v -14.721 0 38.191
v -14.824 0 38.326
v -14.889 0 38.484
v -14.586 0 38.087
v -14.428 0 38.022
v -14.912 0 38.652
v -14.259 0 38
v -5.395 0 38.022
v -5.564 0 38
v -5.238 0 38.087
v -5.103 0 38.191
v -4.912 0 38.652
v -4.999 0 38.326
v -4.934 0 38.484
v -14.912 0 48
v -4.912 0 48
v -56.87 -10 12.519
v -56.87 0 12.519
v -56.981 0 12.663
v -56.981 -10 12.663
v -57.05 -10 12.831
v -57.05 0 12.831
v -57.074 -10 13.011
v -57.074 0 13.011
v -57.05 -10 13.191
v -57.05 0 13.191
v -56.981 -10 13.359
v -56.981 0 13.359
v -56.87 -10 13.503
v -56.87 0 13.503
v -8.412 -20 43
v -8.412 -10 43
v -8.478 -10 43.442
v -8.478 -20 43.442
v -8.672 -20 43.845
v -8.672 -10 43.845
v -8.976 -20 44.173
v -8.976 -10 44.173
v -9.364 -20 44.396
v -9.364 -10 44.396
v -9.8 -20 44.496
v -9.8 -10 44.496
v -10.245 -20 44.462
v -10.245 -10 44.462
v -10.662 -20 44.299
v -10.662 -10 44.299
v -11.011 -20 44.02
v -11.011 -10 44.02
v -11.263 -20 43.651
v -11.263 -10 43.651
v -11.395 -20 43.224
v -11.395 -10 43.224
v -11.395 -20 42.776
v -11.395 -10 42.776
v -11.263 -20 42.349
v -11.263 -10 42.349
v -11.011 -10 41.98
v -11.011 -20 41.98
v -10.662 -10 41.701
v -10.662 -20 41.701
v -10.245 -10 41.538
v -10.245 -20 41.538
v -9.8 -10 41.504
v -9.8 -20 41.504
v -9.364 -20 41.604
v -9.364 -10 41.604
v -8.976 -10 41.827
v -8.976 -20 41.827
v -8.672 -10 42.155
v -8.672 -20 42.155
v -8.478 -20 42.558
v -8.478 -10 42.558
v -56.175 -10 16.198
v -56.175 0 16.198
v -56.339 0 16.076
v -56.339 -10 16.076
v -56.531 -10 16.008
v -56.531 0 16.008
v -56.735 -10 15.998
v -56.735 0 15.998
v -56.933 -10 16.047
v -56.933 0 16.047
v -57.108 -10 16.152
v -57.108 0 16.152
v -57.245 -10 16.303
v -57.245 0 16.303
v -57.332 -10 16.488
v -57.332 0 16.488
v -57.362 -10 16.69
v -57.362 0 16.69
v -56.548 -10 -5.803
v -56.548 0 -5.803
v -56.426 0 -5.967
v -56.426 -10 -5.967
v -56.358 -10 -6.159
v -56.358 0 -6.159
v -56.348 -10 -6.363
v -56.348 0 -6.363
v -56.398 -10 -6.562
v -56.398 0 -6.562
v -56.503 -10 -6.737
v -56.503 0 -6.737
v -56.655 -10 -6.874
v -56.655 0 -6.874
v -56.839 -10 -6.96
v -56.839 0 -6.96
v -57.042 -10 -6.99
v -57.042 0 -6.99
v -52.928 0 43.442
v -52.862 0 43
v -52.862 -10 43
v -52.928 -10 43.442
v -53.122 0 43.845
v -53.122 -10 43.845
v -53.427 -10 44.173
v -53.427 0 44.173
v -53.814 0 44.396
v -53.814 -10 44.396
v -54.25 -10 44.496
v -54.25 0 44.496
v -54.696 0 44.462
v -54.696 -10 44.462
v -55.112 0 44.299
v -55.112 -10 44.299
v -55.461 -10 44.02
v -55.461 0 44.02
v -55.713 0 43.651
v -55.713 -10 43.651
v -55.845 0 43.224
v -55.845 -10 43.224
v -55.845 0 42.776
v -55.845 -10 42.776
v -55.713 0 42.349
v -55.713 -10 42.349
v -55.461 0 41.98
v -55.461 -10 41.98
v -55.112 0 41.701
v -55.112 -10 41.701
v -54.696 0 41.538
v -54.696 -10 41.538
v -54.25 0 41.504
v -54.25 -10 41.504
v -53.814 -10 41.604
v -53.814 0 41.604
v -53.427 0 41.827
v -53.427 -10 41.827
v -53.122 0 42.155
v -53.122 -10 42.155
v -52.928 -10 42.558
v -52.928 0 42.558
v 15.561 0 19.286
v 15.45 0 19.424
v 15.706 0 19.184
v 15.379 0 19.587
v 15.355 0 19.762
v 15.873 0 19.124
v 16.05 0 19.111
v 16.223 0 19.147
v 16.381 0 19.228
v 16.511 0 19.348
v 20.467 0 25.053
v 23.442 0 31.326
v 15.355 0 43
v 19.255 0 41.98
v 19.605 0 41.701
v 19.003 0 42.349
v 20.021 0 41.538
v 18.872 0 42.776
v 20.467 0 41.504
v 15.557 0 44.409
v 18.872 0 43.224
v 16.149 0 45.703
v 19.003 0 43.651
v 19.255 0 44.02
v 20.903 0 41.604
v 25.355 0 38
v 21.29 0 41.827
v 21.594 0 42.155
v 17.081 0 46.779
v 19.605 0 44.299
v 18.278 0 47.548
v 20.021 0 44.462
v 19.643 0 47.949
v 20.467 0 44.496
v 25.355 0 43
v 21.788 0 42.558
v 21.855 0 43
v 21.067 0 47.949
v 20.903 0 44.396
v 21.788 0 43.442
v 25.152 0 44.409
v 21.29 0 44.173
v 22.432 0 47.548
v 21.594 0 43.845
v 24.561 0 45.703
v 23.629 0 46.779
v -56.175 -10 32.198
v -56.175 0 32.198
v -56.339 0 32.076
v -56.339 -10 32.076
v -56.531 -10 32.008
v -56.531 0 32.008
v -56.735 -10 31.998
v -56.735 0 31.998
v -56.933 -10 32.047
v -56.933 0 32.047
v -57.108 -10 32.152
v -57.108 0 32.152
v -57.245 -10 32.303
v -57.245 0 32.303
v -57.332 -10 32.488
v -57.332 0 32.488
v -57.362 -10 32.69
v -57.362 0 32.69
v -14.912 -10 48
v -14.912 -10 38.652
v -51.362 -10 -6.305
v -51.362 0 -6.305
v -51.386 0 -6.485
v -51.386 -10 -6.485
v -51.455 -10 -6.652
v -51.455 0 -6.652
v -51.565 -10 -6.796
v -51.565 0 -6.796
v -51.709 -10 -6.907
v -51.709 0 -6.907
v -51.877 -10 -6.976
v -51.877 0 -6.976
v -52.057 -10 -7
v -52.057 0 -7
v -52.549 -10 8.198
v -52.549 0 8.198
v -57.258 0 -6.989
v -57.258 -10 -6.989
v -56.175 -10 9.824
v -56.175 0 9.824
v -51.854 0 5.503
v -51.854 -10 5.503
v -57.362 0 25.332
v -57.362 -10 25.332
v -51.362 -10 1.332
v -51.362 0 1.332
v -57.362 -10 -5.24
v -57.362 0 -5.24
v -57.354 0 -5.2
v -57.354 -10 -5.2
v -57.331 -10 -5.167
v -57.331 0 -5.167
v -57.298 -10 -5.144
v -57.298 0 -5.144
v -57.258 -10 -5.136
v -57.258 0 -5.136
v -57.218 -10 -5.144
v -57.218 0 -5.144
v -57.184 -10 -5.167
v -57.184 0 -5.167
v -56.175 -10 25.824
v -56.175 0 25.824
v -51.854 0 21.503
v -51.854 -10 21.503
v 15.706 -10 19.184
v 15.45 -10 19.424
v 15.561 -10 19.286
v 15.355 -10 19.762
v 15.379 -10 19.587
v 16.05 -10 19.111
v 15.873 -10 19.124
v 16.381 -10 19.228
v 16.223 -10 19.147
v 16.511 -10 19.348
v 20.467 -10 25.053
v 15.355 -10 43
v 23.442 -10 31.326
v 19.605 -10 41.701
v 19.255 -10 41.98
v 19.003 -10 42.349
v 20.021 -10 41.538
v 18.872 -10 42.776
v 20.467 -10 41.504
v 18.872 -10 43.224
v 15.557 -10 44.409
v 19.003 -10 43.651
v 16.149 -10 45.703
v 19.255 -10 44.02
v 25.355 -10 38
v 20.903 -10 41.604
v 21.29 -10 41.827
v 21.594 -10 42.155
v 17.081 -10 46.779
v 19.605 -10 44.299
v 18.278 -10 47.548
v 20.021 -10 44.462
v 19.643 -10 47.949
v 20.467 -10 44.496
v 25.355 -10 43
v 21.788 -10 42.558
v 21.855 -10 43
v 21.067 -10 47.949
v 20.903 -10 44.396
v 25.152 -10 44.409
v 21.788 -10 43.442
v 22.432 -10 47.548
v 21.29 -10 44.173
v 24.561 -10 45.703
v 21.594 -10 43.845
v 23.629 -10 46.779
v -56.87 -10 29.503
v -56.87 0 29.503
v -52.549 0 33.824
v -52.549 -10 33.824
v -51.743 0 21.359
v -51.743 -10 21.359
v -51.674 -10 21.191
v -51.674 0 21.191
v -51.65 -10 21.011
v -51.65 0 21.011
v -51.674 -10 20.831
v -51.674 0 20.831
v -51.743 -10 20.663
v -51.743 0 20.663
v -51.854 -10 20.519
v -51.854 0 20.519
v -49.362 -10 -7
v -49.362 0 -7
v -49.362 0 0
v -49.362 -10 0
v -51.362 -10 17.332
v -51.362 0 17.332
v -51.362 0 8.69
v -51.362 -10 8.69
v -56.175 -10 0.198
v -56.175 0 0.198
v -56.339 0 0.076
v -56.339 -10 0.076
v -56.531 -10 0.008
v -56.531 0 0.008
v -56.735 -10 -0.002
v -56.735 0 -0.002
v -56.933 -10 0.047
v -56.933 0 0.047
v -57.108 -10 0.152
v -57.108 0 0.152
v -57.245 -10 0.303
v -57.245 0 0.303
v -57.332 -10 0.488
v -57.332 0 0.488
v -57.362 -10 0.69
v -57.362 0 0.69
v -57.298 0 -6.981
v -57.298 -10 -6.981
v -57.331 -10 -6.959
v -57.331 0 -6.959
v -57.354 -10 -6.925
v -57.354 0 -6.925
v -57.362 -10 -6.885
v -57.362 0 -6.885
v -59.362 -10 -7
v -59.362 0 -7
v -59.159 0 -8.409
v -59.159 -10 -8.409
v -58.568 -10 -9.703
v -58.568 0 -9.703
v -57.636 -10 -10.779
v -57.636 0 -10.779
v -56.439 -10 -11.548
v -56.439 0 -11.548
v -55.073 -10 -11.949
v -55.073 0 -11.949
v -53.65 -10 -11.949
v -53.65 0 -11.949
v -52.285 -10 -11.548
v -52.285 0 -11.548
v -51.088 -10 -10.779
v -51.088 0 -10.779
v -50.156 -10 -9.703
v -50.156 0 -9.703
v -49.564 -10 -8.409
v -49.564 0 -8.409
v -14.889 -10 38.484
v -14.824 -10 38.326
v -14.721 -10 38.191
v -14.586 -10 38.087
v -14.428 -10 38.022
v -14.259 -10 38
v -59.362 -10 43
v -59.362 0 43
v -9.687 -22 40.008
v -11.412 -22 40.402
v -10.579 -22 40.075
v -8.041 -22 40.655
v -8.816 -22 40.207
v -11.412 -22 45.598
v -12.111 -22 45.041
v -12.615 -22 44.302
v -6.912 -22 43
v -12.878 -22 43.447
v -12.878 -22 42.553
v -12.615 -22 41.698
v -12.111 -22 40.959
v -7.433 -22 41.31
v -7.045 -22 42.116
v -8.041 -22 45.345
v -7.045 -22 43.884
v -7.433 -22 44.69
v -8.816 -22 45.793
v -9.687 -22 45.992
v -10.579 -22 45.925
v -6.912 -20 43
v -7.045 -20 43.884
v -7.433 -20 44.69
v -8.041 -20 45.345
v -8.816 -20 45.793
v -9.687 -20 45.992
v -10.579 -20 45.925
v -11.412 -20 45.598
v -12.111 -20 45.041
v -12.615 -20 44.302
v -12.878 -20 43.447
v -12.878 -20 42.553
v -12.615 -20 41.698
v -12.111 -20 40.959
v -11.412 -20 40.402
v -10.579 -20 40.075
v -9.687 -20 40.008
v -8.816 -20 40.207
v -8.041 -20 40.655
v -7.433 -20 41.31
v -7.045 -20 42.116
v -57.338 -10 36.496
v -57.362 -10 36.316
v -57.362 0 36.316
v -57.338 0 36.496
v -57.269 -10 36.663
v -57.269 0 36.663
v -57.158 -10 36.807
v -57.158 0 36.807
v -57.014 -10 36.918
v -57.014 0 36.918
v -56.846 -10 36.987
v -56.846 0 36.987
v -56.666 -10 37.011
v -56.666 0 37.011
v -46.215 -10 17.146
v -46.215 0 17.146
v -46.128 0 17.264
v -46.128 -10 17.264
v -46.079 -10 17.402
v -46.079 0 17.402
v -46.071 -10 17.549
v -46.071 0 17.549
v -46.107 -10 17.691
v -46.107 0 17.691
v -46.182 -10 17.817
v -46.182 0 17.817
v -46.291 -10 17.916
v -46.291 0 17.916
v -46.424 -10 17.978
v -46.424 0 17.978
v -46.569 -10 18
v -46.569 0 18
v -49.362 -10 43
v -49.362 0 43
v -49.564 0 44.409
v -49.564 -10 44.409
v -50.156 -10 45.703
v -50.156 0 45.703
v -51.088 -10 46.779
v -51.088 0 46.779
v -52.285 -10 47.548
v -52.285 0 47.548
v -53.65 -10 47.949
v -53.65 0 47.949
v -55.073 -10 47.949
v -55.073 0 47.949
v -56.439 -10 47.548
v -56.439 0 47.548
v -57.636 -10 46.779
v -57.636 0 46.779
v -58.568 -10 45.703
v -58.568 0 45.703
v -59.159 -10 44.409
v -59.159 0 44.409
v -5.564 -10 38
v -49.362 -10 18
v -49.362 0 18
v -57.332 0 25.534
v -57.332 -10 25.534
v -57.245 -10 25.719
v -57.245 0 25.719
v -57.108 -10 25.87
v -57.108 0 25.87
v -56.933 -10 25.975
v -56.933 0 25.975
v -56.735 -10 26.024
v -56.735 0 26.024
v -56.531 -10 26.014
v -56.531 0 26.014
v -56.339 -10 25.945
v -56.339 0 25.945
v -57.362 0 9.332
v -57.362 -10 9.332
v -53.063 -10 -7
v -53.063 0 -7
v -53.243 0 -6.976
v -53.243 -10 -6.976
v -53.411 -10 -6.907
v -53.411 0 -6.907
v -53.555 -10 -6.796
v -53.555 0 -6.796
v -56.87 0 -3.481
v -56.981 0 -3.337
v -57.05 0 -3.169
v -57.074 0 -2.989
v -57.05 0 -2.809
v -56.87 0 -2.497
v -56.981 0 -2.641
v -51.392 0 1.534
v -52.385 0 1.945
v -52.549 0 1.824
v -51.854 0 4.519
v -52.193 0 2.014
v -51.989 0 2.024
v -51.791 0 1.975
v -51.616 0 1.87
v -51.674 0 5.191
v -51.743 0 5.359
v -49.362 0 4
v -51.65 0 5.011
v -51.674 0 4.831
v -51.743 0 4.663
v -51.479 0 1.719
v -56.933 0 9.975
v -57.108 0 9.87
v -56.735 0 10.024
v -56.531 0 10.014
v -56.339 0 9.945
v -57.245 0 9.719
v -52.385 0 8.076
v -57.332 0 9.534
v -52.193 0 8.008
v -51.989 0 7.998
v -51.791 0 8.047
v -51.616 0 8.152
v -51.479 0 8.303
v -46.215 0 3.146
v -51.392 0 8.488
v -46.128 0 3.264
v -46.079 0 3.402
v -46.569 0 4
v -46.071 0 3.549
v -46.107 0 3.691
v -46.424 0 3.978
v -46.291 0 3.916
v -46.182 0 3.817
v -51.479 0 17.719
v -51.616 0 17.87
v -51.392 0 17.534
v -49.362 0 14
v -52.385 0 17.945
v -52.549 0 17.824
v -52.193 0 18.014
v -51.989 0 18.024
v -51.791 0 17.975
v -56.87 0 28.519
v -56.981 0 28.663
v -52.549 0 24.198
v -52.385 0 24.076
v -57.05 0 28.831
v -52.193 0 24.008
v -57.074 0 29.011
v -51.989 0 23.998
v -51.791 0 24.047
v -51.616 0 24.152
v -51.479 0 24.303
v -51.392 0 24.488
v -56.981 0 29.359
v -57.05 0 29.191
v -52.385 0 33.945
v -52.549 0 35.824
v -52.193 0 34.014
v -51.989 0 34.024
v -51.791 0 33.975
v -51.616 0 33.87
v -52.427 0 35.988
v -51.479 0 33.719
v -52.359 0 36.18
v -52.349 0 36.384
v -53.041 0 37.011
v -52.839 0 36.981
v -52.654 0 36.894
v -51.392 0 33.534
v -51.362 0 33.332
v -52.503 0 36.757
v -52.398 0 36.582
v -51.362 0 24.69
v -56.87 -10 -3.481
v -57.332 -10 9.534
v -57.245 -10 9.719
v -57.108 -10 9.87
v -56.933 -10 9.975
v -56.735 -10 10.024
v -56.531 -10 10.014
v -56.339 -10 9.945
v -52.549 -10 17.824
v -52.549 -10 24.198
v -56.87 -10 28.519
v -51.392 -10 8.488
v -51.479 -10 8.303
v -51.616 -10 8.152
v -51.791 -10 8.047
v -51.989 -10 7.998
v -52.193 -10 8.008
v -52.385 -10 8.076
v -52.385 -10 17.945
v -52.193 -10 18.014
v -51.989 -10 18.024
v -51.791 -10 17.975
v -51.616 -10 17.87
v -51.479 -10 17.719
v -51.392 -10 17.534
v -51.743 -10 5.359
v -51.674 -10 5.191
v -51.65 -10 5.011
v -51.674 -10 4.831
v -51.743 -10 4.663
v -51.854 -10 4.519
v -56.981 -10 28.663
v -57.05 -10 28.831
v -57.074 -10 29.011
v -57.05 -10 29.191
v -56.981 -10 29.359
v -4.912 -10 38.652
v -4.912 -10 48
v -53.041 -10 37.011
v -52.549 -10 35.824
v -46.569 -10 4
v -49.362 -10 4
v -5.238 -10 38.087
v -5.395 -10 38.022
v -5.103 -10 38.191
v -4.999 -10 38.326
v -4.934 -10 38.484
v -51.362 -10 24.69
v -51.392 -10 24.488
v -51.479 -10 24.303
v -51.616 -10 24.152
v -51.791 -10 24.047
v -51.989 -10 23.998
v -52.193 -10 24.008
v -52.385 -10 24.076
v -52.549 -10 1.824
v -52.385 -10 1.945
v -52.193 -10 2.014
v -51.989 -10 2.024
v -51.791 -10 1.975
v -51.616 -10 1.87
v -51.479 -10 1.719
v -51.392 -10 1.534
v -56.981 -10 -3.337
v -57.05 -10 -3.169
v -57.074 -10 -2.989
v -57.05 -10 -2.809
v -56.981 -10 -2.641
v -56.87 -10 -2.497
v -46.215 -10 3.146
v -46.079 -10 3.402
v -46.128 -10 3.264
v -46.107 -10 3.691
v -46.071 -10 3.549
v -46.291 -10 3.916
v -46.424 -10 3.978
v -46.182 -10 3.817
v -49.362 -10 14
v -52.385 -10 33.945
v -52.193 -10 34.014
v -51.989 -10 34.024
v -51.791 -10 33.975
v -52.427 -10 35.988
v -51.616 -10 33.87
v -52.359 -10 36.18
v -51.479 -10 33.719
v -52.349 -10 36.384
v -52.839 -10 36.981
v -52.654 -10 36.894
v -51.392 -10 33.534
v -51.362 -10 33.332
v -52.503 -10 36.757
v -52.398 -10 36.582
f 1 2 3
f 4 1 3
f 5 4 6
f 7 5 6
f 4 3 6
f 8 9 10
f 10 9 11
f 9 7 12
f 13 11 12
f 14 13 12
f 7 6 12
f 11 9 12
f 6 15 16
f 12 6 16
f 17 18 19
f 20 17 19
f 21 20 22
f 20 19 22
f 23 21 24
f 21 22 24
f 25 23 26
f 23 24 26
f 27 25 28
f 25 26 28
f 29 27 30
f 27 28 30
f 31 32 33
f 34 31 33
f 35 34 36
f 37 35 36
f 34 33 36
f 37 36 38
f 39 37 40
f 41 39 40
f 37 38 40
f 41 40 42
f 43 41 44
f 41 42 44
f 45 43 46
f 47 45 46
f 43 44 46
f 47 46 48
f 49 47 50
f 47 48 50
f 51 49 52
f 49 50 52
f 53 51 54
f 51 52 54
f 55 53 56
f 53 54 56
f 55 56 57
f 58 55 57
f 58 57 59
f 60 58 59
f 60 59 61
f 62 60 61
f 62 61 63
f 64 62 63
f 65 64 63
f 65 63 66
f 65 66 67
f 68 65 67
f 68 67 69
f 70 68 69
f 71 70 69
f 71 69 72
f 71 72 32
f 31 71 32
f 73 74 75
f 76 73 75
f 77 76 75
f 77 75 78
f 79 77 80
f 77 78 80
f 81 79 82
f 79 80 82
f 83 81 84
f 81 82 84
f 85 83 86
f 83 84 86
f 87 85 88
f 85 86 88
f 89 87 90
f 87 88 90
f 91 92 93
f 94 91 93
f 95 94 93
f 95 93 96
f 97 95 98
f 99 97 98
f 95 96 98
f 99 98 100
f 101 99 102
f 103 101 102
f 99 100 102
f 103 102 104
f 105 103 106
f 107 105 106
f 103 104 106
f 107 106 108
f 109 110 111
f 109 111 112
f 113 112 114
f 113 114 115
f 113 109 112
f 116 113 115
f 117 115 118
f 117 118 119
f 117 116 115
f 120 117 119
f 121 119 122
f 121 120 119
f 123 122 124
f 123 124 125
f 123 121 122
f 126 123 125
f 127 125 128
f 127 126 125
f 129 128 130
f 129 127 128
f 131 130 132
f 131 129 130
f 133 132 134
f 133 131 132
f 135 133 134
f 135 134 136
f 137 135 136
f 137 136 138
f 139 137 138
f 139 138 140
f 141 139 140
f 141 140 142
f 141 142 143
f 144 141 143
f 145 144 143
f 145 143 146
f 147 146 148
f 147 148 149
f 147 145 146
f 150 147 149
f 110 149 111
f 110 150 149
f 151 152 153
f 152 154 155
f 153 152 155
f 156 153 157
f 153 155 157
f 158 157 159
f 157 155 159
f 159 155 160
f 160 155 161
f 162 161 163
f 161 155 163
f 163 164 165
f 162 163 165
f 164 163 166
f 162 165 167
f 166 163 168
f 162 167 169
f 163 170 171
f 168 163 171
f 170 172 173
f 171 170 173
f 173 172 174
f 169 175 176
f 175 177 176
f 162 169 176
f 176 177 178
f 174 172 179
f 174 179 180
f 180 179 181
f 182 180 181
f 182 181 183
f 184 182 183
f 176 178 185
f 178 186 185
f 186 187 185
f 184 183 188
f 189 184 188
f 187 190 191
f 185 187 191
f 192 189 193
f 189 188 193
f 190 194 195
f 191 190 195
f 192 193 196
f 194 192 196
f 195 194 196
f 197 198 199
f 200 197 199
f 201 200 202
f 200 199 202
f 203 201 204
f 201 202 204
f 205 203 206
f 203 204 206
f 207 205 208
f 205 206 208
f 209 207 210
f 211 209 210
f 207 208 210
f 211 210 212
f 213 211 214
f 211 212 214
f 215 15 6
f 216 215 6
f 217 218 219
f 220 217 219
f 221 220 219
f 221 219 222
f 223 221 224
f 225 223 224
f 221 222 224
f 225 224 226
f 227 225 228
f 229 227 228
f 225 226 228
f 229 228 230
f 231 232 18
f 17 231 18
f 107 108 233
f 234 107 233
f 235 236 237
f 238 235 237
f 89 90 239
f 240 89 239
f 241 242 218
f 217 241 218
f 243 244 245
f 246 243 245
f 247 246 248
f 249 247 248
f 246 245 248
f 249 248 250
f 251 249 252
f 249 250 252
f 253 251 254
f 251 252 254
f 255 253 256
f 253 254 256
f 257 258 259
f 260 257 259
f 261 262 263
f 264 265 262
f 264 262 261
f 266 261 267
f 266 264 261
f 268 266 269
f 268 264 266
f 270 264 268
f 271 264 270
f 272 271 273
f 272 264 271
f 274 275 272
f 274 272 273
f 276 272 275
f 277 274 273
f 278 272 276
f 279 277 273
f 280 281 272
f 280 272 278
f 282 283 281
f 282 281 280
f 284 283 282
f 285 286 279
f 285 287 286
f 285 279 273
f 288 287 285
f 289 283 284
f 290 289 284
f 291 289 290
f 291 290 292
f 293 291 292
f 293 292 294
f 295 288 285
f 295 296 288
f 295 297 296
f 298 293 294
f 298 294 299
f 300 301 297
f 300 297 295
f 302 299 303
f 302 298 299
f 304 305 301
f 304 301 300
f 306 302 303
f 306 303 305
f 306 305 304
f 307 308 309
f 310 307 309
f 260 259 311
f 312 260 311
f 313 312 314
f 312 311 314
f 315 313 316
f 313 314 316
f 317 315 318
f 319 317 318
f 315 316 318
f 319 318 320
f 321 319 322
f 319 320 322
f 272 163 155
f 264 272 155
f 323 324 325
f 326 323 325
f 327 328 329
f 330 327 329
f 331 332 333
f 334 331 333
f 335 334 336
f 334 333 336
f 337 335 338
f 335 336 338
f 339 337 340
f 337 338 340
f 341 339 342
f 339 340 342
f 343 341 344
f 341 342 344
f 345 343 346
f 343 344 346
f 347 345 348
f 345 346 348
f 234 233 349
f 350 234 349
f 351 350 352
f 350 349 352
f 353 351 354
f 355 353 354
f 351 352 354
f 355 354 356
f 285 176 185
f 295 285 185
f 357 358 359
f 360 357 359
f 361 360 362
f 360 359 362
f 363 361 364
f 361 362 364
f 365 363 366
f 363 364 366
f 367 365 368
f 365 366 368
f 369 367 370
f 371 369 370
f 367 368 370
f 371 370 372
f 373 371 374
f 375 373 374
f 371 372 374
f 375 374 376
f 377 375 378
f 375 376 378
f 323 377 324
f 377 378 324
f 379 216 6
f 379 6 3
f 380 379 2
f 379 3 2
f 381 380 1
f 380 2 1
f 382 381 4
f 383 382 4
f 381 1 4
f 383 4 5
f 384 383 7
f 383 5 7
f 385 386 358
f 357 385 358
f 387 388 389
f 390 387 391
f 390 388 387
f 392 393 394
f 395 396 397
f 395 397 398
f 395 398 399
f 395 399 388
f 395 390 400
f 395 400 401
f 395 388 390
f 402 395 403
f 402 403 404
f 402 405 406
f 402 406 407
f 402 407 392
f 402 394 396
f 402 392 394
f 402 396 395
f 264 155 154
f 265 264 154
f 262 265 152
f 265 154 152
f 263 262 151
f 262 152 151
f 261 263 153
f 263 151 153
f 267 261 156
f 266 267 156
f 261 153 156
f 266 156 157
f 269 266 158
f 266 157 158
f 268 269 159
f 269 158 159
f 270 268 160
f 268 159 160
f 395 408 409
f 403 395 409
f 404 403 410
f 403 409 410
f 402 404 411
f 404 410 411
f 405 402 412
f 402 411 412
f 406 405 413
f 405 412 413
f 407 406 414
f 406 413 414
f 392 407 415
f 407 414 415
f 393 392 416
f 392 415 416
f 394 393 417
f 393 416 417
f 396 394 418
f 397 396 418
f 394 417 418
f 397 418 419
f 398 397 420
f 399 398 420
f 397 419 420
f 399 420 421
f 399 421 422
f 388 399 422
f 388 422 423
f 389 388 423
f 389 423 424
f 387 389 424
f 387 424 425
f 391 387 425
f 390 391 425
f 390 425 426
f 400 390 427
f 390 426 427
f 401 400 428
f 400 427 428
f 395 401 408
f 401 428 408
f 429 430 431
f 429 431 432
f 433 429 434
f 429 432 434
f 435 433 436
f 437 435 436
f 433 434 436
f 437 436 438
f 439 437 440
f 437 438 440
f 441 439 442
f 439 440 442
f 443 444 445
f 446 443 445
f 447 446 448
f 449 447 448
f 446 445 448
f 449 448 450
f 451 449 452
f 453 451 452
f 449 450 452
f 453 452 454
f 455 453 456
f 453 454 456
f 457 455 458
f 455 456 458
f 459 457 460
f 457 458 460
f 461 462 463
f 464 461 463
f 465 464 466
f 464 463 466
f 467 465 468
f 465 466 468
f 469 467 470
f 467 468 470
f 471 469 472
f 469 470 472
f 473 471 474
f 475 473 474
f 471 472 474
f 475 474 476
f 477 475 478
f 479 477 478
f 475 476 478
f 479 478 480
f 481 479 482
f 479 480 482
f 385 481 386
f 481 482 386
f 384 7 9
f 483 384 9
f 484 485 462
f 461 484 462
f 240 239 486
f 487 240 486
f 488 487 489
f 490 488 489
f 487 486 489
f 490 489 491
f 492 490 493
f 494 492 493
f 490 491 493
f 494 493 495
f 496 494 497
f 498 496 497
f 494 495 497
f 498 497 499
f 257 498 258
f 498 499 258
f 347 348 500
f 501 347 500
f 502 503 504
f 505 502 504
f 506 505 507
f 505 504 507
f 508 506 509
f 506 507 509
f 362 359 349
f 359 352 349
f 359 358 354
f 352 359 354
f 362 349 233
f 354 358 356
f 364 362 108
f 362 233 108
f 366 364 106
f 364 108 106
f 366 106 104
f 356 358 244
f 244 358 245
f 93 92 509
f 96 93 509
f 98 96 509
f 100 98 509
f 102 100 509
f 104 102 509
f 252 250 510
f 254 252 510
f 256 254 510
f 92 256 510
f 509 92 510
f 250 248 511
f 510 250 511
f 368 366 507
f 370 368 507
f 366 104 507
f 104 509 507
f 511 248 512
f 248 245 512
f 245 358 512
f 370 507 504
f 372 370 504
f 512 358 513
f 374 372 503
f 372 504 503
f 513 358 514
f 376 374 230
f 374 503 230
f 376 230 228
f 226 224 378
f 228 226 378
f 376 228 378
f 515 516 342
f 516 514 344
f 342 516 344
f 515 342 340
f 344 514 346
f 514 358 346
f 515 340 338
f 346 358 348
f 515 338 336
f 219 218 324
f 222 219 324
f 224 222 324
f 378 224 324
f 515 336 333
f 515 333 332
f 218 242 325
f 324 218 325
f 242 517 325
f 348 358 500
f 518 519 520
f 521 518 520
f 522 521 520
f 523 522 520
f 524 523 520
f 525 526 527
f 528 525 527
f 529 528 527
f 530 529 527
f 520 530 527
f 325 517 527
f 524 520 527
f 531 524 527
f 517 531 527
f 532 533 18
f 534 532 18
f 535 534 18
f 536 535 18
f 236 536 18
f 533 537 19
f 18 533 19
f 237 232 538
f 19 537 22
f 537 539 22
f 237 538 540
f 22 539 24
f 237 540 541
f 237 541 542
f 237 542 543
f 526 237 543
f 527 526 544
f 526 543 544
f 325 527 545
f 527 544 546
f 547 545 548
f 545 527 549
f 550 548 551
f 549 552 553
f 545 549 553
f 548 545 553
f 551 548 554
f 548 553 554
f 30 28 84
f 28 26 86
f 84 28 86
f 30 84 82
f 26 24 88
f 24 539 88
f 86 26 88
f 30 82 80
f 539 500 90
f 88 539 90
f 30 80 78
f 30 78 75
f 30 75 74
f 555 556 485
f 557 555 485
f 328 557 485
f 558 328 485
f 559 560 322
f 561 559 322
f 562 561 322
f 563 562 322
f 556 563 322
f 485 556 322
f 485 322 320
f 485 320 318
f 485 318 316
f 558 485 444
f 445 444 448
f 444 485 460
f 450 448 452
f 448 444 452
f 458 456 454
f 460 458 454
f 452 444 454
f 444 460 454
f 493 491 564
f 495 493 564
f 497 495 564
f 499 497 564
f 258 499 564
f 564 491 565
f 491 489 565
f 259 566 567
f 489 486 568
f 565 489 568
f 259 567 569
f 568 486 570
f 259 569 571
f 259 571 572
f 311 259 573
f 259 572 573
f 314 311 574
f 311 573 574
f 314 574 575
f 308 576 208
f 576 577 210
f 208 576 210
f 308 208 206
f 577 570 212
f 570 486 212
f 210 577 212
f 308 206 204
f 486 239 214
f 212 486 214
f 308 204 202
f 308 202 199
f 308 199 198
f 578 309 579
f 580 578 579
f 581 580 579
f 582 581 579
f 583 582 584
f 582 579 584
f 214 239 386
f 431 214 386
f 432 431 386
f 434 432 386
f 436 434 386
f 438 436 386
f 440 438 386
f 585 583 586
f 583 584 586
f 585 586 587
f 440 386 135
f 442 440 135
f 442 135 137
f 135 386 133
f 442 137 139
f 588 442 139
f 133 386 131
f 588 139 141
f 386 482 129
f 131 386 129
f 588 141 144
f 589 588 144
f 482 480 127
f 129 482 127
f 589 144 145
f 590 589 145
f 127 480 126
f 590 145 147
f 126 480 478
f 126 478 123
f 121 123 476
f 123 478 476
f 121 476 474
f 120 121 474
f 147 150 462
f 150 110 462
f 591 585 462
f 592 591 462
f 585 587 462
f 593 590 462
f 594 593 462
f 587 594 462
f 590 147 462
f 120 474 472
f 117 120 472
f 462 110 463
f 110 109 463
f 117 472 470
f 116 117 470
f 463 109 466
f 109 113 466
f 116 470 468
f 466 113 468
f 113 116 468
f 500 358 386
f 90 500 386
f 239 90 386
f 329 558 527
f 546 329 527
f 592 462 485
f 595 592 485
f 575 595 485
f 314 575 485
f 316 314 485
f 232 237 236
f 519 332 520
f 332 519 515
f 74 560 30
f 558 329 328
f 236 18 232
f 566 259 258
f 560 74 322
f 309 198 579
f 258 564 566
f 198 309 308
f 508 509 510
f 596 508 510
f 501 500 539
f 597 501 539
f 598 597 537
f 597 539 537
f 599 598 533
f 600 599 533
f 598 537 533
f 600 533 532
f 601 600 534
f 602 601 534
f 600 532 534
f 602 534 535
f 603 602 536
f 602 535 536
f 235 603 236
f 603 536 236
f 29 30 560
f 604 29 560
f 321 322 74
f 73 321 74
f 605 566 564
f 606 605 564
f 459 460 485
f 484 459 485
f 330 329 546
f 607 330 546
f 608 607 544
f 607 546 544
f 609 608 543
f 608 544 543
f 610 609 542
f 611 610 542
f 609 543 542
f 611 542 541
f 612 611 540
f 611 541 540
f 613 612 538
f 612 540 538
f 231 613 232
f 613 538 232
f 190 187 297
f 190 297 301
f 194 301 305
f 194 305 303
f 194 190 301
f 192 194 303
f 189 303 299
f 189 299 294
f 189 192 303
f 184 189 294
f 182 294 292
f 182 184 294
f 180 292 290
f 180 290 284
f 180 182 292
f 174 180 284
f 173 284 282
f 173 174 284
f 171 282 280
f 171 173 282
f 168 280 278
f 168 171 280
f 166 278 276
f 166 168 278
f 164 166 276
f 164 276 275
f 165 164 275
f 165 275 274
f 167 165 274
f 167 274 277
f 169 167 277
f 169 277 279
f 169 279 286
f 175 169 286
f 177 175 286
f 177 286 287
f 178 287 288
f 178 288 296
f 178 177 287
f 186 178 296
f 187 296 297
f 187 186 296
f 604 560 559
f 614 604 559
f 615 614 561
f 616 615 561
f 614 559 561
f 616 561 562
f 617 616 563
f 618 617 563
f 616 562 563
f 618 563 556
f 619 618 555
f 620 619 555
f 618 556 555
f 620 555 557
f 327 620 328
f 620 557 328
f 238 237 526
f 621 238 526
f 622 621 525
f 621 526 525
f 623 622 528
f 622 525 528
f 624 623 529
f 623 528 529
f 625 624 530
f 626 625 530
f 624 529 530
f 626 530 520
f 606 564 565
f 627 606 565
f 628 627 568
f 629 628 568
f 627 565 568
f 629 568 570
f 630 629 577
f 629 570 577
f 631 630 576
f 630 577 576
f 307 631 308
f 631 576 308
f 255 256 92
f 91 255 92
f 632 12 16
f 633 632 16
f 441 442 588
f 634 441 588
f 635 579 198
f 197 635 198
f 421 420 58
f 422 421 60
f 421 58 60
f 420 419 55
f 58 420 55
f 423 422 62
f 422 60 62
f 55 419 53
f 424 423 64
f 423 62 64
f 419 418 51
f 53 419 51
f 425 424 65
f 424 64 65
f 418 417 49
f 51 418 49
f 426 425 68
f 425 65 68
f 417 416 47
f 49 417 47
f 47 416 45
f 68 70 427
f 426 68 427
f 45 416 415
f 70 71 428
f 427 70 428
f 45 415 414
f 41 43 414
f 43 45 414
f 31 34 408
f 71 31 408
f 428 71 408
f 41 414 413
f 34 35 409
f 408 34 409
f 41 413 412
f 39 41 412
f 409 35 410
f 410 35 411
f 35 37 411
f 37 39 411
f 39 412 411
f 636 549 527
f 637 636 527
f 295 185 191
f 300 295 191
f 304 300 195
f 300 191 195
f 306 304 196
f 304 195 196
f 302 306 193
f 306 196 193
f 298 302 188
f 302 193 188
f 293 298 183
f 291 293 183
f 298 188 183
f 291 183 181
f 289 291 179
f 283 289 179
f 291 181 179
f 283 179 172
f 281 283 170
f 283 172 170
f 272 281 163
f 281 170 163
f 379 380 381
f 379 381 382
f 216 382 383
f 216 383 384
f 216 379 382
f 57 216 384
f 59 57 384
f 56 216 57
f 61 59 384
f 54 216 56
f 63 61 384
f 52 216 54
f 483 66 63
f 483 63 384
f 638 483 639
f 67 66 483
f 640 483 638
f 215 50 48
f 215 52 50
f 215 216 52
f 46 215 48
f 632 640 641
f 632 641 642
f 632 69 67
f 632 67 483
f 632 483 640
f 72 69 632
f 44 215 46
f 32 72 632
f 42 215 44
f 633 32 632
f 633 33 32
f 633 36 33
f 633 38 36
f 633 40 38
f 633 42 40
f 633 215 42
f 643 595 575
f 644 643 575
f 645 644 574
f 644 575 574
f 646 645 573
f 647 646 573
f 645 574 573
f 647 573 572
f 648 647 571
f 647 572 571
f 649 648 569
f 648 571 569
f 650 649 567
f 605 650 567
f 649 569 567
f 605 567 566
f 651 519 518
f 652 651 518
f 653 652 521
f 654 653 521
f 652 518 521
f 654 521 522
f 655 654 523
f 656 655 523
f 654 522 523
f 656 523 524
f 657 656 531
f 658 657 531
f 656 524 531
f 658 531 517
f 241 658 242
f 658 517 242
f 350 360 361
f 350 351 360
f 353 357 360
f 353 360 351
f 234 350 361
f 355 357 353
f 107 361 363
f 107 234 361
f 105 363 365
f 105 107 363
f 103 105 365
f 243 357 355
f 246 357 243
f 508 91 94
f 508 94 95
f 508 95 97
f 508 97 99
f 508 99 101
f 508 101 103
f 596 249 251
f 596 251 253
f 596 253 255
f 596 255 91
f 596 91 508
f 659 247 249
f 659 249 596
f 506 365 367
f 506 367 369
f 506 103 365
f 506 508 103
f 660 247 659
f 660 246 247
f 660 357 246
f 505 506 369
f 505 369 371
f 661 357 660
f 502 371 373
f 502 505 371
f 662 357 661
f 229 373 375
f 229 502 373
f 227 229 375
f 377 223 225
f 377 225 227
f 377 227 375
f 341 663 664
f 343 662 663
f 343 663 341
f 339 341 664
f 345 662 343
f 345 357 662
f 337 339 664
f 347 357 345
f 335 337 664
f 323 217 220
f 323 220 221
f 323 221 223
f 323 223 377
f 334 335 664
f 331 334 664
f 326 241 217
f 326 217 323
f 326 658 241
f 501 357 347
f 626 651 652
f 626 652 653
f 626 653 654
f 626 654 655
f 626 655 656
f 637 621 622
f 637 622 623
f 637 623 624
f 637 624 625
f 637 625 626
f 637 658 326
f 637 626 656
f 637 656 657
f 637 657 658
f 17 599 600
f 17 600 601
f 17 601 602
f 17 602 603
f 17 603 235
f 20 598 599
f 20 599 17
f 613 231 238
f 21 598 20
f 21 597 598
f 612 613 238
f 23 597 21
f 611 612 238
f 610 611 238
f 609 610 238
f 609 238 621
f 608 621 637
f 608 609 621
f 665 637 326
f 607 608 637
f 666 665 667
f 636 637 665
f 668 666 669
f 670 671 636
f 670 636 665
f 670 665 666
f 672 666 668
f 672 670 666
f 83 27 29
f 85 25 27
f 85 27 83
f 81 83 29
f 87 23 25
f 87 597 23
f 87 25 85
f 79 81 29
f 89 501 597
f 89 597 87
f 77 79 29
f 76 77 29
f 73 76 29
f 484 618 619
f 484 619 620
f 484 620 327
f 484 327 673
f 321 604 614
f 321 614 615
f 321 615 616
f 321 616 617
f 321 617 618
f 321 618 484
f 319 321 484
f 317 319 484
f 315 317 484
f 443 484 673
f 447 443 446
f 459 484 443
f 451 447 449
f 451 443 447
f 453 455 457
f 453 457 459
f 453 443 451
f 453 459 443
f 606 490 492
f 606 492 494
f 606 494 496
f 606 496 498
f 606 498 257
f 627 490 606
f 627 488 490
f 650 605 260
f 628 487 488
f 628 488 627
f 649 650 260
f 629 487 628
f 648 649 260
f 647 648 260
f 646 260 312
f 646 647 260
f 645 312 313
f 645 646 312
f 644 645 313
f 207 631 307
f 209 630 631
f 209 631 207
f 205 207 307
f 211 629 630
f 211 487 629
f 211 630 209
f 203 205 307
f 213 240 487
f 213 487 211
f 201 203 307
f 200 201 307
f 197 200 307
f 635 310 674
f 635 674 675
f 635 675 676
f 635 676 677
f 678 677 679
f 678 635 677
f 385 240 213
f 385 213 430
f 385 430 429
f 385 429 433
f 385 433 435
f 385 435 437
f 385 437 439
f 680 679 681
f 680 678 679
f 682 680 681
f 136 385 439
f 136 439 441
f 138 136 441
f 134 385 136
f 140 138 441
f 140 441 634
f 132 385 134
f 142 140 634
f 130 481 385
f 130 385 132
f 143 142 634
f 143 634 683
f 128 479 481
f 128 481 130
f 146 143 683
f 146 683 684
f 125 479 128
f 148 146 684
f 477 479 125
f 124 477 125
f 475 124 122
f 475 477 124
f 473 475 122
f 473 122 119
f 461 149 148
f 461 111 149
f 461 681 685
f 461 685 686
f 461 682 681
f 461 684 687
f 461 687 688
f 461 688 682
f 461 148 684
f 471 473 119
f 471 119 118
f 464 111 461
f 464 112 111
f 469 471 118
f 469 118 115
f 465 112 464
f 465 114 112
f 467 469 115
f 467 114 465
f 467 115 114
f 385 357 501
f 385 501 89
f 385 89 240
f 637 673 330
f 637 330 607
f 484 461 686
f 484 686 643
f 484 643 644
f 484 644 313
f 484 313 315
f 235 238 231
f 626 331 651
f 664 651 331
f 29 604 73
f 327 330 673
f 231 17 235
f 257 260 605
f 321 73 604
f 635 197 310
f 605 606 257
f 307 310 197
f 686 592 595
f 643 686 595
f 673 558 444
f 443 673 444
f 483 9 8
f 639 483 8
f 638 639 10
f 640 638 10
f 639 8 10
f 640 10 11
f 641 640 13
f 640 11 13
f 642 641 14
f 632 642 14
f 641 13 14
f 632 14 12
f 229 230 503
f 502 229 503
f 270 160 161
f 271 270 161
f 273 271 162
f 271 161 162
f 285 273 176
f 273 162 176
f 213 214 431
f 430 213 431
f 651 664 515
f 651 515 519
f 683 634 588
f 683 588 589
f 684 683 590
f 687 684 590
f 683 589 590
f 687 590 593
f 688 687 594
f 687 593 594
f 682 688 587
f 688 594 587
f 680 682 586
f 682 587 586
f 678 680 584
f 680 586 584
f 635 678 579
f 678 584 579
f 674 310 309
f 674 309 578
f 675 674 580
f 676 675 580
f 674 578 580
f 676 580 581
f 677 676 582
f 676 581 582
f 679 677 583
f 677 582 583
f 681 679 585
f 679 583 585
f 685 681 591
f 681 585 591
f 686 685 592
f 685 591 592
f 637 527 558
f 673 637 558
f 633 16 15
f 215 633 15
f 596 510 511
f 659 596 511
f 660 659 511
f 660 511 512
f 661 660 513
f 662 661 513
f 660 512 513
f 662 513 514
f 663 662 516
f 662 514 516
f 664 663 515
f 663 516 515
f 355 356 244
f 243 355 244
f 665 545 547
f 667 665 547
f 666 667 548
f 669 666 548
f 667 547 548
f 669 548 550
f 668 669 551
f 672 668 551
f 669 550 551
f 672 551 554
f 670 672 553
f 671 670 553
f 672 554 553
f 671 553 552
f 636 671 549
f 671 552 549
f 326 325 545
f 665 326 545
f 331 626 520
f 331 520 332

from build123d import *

# Parameters (mm, degrees)
F0_R     = 1.5
F1_DEPTH = 10
F2_DEPTH = 10
F3_DEPTH = 20
F4_R     = 3
F4_R_2   = 1.5
F5_DEPTH = 2


with BuildPart() as f1:
    # F0 (on Front) → F1 (new body)
    with BuildSketch(Plane.XZ):
        with BuildLine():
            ThreePointArc((-49.3618067241, 43), (-54.3618067241, 48), (-59.3618067241, 43))
            Line((-59.3618067241, 43), (-59.3618067241, -7))
            ThreePointArc((-59.3618067241, -7), (-54.3618067241, -12), (-49.3618067241, -7))
            Line((-49.3618067241, -7), (-49.3618067241, 0))
            Line((-49.3618067241, 0), (-49.3618067241, 4))
            Line((-49.3618067241, 4), (-49.3618067241, 14))
            Line((-49.3618067241, 14), (-49.3618067241, 18))
            Line((-49.3618067241, 18), (-49.3618067241, 43))
        make_face()
        with BuildLine():
            ThreePointArc((-57.2580112192, -6.9893327339), (-57.3314228931, -6.958748362), (-57.3618067241, -6.8852534609))
            Line((-57.3618067241, -6.8852534609), (-57.3618067241, -5.2403198815))
            ThreePointArc((-57.3618067241, -5.2403198815), (-57.2975566251, -5.1441628131), (-57.1841316293, -5.1667244475))
            Line((-57.1841316293, -5.1667244475), (-56.5479916643, -5.8028644125))
            ThreePointArc((-56.5479916643, -5.8028644125), (-56.3976194008, -6.5615427862), (-57.0415872264, -6.989923612))
            Line((-57.0415872264, -6.989923612), (-57.2580112192, -6.9893327339))
        make_face(mode=Mode.SUBTRACT)
        with BuildLine():
            Line((-51.3618067241, 1.332191763), (-51.3618067241, -6.3046353022))
            ThreePointArc((-51.3618067241, -6.3046353022), (-51.5654743287, -6.7963323954), (-52.0571714219, -7))
            Line((-52.0571714219, -7), (-53.0628265882, -7))
            ThreePointArc((-53.0628265882, -7), (-53.3289311375, -6.9470685141), (-53.5545236814, -6.7963323954))
            Line((-53.5545236814, -6.7963323954), (-56.8701096309, -3.4807464459))
            ThreePointArc((-56.8701096309, -3.4807464459), (-57.0737772355, -2.9890493527), (-56.8701096309, -2.4973522595))
            Line((-56.8701096309, -2.4973522595), (-52.5488685151, 1.8238888563))
            ThreePointArc((-52.5488685151, 1.8238888563), (-51.7910668726, 1.974624975), (-51.3618067241, 1.332191763))
        make_face(mode=Mode.SUBTRACT)
        with BuildLine():
            Line((-56.1747449331, 9.8238888563), (-51.8535038173, 5.5026477405))
            ThreePointArc((-51.8535038173, 5.5026477405), (-51.6498362127, 5.0109506473), (-51.8535038173, 4.5192535541))
            Line((-51.8535038173, 4.5192535541), (-56.1747449331, 0.1980124383))
            ThreePointArc((-56.1747449331, 0.1980124383), (-56.9325465756, 0.0472763196), (-57.3618067241, 0.6897095315))
            Line((-57.3618067241, 0.6897095315), (-57.3618067241, 9.332191763))
            ThreePointArc((-57.3618067241, 9.332191763), (-56.9325465756, 9.974624975), (-56.1747449331, 9.8238888563))
        make_face(mode=Mode.SUBTRACT)
        with BuildLine():
            Line((-56.8701096309, 13.5026477405), (-52.5488685151, 17.8238888563))
            ThreePointArc((-52.5488685151, 17.8238888563), (-51.7910668726, 17.974624975), (-51.3618067241, 17.332191763))
            Line((-51.3618067241, 17.332191763), (-51.3618067241, 8.6897095315))
            ThreePointArc((-51.3618067241, 8.6897095315), (-51.7910668726, 8.0472763196), (-52.5488685151, 8.1980124383))
            Line((-52.5488685151, 8.1980124383), (-56.8701096309, 12.5192535541))
            ThreePointArc((-56.8701096309, 12.5192535541), (-57.0737772355, 13.0109506473), (-56.8701096309, 13.5026477405))
        make_face(mode=Mode.SUBTRACT)
        with BuildLine():
            ThreePointArc((-57.3618067241, 25.332191763), (-56.9325465756, 25.974624975), (-56.1747449331, 25.8238888563))
            Line((-56.1747449331, 25.8238888563), (-51.8535038173, 21.5026477405))
            ThreePointArc((-51.8535038173, 21.5026477405), (-51.6498362127, 21.0109506473), (-51.8535038173, 20.5192535541))
            Line((-51.8535038173, 20.5192535541), (-56.1747449331, 16.1980124383))
            ThreePointArc((-56.1747449331, 16.1980124383), (-56.9325465756, 16.0472763196), (-57.3618067241, 16.6897095315))
            Line((-57.3618067241, 16.6897095315), (-57.3618067241, 25.332191763))
        make_face(mode=Mode.SUBTRACT)
        with BuildLine():
            ThreePointArc((-56.8701096309, 28.5192535541), (-57.0737772355, 29.0109506473), (-56.8701096309, 29.5026477405))
            Line((-56.8701096309, 29.5026477405), (-52.5488685151, 33.8238888563))
            ThreePointArc((-52.5488685151, 33.8238888563), (-51.7910668726, 33.974624975), (-51.3618067241, 33.332191763))
            Line((-51.3618067241, 33.332191763), (-51.3618067241, 24.6897095315))
            ThreePointArc((-51.3618067241, 24.6897095315), (-51.7910668726, 24.0472763196), (-52.5488685151, 24.1980124383))
            Line((-52.5488685151, 24.1980124383), (-56.8701096309, 28.5192535541))
        make_face(mode=Mode.SUBTRACT)
        with BuildLine():
            ThreePointArc((-57.3618067241, 36.3155859495), (-57.1581391195, 36.8072830427), (-56.6664420263, 37.0109506473))
            Line((-56.6664420263, 37.0109506473), (-53.0405656084, 37.0109506473))
            ThreePointArc((-53.0405656084, 37.0109506473), (-52.3981323964, 36.5816904988), (-52.5488685151, 35.8238888563))
            Line((-52.5488685151, 35.8238888563), (-56.1747449331, 32.1980124383))
            ThreePointArc((-56.1747449331, 32.1980124383), (-56.9325465756, 32.0472763196), (-57.3618067241, 32.6897095315))
            Line((-57.3618067241, 32.6897095315), (-57.3618067241, 36.3155859495))
        make_face(mode=Mode.SUBTRACT)
        with Locations((-54.3618067241, 43)):
            Circle(F0_R, mode=Mode.SUBTRACT)
        with BuildLine():
            Line((-46.5689135053, 18), (-49.3618067241, 18))
            Line((-49.3618067241, 18), (-49.3618067241, 14))
            Line((-49.3618067241, 14), (-46.2153601147, 17.1464466094))
            ThreePointArc((-46.2153601147, 17.1464466094), (-46.106973739, 17.6913417162), (-46.5689135053, 18))
        make_face()
        with BuildLine():
            Line((-49.3618067241, 4), (-49.3618067241, 0))
            Line((-49.3618067241, 0), (-46.2153601147, 3.1464466094))
            ThreePointArc((-46.2153601147, 3.1464466094), (-46.106973739, 3.6913417162), (-46.5689135053, 4))
            Line((-46.5689135053, 4), (-49.3618067241, 4))
        make_face()
    extrude(amount=F1_DEPTH)


with BuildPart() as f2:
    # F0 (on Front) → F2 (new body)
    with BuildSketch(Plane.XZ):
        with BuildLine():
            Line((25.3549321741, 38), (25.3549321741, 43))
            ThreePointArc((25.3549321741, 43), (20.3549321741, 48), (15.3549321741, 43))
            Line((15.3549321741, 43), (15.3549321741, 38))
            Line((15.3549321741, 38), (15.3549321741, 19.7624126063))
            ThreePointArc((15.3549321741, 19.7624126063), (15.7872667899, 19.1482738745), (16.5112376477, 19.3481383261))
            ThreePointArc((16.5112376477, 19.3481383261), (22.0826940336, 28.1289872788), (25.3549321741, 38))
        make_face()
        with Locations((20.3549321741, 43)):
            Circle(F0_R, mode=Mode.SUBTRACT)
    extrude(amount=F2_DEPTH)


with BuildPart() as f2b:
    # F0 (on Front) → F2, piece 2 (new body)
    with BuildSketch(Plane.XZ):
        with BuildLine():
            Line((-4.9116824567, 48), (-14.9116824567, 48))
            Line((-14.9116824567, 48), (-14.9116824567, 38.6523646052))
            ThreePointArc((-14.9116824567, 38.6523646052), (-14.7206092877, 38.1910731691), (-14.2593178515, 38))
            Line((-14.2593178515, 38), (-5.5640470619, 38))
            ThreePointArc((-5.5640470619, 38), (-5.1027556258, 38.1910731691), (-4.9116824567, 38.6523646052))
            Line((-4.9116824567, 38.6523646052), (-4.9116824567, 48))
        make_face()
        with Locations((-9.9116824567, 43)):
            Circle(F0_R, mode=Mode.SUBTRACT)
    extrude(amount=F2_DEPTH)

    # F0 (on Front) → F3 (join)
    with BuildSketch(Plane.XZ):
        with Locations((-9.9116824567, 43)):
            Circle(F0_R)
    extrude(amount=F3_DEPTH)

    # F4 (on face) → F5 (join)
    with BuildSketch(Plane.XZ.offset(20)):
        with Locations((-9.9116824567, 43)):
            Circle(F4_R)
        with Locations((-9.9116824567, 43)):
            Circle(F4_R_2, mode=Mode.SUBTRACT)
        with Locations((-9.9116824567, 43)):
            Circle(F4_R_2)
    extrude(amount=F5_DEPTH)


solid = Compound([f1.part, f2.part, f2b.part])
